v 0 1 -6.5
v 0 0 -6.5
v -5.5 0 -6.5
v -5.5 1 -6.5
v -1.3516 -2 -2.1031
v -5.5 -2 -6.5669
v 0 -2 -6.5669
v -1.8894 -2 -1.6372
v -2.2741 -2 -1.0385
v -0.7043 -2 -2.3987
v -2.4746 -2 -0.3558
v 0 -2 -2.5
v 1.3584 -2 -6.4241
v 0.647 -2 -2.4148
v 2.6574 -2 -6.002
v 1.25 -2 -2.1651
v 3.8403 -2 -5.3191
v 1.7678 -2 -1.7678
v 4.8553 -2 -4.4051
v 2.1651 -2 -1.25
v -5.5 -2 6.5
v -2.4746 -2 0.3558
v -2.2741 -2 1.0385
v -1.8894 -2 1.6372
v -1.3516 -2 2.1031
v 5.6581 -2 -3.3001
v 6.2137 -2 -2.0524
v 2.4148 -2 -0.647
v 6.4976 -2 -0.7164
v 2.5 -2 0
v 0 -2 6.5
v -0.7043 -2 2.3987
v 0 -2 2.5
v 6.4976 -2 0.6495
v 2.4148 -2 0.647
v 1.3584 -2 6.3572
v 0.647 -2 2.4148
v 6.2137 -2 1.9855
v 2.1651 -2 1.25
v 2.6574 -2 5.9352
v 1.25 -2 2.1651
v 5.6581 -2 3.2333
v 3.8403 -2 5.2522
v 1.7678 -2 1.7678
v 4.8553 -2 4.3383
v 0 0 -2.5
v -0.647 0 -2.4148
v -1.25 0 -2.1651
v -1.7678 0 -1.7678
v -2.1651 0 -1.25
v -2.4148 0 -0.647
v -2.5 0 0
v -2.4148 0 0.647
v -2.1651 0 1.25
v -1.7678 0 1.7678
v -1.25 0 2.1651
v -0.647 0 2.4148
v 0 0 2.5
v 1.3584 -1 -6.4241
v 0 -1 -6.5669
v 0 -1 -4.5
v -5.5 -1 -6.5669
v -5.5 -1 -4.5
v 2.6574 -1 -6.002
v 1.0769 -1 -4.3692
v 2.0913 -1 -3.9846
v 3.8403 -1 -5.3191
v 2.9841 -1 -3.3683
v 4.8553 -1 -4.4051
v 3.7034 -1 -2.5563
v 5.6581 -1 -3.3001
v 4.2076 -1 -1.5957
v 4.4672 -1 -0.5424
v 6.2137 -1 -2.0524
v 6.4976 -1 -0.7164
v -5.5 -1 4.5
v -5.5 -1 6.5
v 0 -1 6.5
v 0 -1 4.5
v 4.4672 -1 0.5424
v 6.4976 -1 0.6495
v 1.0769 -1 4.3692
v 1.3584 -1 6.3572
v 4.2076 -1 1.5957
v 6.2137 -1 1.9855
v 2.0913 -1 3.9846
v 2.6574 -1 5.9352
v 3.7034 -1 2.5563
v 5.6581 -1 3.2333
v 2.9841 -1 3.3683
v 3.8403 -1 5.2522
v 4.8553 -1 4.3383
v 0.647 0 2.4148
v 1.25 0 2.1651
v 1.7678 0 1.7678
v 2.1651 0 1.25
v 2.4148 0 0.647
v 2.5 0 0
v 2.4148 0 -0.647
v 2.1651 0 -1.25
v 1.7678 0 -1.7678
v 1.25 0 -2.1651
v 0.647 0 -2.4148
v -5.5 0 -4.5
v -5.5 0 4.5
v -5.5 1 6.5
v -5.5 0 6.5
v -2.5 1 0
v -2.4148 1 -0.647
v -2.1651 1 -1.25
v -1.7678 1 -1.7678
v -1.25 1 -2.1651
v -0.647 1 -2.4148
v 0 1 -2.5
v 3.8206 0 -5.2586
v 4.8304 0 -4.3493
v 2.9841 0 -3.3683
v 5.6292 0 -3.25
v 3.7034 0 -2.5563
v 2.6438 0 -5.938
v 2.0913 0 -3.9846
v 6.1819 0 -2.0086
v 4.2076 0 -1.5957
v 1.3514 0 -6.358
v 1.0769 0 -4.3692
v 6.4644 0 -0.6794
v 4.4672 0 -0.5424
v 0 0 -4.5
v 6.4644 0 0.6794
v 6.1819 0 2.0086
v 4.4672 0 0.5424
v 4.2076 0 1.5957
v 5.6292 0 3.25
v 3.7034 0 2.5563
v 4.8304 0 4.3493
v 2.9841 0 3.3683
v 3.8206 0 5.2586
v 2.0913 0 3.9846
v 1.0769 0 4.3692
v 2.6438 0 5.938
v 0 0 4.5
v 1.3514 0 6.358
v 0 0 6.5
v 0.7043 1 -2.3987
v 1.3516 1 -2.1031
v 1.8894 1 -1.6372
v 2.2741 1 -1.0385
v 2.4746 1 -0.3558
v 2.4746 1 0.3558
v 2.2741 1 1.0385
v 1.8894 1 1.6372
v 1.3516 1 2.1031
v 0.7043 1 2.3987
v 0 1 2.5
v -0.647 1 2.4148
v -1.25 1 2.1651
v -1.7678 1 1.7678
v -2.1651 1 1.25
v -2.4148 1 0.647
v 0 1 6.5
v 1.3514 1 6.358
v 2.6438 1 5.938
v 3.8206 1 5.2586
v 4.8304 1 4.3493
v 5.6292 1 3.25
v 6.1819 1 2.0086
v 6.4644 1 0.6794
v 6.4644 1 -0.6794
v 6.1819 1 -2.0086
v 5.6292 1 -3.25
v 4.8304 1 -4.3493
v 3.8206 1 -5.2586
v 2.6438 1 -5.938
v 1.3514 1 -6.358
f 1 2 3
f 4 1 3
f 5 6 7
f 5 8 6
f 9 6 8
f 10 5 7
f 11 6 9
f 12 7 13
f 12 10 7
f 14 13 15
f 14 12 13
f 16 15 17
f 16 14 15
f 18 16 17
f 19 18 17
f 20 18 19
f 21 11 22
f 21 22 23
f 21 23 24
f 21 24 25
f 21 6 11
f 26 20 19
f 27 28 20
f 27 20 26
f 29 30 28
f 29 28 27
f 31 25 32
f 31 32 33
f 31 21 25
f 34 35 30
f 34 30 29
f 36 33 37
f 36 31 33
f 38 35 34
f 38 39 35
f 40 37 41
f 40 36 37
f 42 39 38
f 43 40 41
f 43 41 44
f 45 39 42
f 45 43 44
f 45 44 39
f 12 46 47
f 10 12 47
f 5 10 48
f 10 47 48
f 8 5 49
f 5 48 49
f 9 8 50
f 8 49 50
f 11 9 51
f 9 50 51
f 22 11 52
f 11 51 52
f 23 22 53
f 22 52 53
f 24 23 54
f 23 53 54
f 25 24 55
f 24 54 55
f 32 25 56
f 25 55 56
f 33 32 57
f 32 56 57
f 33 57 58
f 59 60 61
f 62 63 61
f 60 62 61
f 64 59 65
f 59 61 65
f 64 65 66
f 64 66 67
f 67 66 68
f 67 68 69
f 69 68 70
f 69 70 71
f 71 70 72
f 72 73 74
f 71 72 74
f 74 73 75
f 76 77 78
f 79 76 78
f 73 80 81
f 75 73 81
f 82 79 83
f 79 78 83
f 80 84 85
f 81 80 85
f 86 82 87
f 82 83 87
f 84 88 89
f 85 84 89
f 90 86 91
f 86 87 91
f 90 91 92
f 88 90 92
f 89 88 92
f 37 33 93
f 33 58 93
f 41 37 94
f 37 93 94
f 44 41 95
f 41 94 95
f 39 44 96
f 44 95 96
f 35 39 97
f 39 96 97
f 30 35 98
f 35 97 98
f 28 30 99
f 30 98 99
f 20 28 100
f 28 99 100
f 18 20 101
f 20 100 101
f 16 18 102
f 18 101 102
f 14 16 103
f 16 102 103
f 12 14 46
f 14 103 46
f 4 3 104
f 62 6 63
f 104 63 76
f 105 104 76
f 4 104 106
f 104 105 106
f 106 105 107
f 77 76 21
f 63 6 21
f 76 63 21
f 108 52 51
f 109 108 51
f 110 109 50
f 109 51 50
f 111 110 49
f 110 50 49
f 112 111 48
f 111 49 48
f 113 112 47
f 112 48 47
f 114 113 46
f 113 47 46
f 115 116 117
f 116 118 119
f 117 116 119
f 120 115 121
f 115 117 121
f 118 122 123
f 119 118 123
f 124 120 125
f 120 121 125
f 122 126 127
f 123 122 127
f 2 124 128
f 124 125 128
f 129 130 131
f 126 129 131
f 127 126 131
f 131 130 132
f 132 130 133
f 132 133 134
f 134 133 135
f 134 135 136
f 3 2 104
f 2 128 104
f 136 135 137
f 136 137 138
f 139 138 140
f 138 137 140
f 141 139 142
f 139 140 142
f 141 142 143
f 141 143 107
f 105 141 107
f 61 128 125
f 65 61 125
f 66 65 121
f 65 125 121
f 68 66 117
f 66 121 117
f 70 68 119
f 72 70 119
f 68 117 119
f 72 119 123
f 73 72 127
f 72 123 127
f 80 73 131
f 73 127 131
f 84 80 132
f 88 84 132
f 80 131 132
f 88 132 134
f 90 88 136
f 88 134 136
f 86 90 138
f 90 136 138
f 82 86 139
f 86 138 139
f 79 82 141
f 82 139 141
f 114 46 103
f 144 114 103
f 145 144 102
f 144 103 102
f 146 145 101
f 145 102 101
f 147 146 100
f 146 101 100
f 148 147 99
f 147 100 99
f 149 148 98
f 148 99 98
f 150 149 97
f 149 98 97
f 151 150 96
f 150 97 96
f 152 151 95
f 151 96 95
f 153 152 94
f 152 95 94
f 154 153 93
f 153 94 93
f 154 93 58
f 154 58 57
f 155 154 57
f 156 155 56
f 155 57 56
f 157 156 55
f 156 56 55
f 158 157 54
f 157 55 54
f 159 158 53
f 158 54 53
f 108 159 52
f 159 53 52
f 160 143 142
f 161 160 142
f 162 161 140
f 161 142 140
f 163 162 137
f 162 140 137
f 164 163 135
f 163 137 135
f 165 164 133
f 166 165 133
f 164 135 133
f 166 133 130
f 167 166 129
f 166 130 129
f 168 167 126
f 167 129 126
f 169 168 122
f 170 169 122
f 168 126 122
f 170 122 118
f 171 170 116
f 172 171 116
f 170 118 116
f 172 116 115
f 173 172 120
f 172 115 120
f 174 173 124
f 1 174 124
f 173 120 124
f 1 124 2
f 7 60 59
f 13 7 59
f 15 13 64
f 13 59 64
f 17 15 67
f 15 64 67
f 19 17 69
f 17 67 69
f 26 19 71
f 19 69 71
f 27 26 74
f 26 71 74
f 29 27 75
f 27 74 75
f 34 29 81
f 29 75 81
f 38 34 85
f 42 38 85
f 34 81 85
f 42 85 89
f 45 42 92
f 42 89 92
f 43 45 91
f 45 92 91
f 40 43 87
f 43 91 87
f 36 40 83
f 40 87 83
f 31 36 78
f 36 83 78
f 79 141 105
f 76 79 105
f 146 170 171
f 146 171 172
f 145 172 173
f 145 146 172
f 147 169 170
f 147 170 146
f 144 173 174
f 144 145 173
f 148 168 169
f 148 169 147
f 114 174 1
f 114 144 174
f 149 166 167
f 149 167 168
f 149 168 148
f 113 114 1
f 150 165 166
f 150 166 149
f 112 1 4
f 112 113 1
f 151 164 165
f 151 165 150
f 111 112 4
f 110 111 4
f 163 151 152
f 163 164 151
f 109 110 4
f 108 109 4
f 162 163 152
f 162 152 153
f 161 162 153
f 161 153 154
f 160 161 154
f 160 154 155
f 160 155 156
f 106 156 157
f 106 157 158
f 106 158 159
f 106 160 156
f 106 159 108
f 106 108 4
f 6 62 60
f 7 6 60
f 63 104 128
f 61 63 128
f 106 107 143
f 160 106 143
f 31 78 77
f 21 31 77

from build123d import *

# Parameters (mm, degrees)
F1_DEPTH = 1
F3_DEPTH = 1
F5_DEPTH = 1


with BuildPart() as f1:
    # F0 (on Front) → F1 (new body)
    with BuildSketch(Plane.XZ):
        with BuildLine():
            ThreePointArc((0, 2.5), (1.767767, 1.767767), (2.5, 0))
            ThreePointArc((2.5, 0), (1.767767, -1.767767), (0, -2.5))
            Line((0, -2.5), (0, -4.5))
            ThreePointArc((0, -4.5), (4.5, 0), (0, 4.5))
            Line((0, 4.5), (0, 2.5))
        make_face()
        with BuildLine():
            ThreePointArc((0, -2.5), (-2.5, 0), (0, 2.5))
            Line((0, 2.5), (0, 4.5))
            Line((0, 4.5), (-5.5, 4.5))
            Line((-5.5, 4.5), (-5.5, -4.5))
            Line((-5.5, -4.5), (0, -4.5))
            Line((0, -4.5), (0, -2.5))
        make_face()
    extrude(amount=F1_DEPTH)

    # F2 (on face) → F3 (join)
    with BuildSketch(Plane.XZ.offset(1)):
        with BuildLine():
            Line((0, 2.5), (0, 6.5))
            Line((0, 6.5), (-5.5, 6.5))
            Line((-5.5, 6.5), (-5.5, -6.566851))
            Line((-5.5, -6.566851), (0, -6.566851))
            Line((0, -6.566851), (0, -2.5))
            ThreePointArc((0, -2.5), (-2.5, 0), (0, 2.5))
        make_face()
        with BuildLine():
            ThreePointArc((0, -6.566851), (6.533425, -0.033425), (0, 6.5))
            Line((0, 6.5), (0, 2.5))
            ThreePointArc((0, 2.5), (1.767767, 1.767767), (2.5, 0))
            ThreePointArc((2.5, 0), (1.767767, -1.767767), (0, -2.5))
            Line((0, -2.5), (0, -6.566851))
        make_face()
    extrude(amount=F3_DEPTH)

    # F4 (on face) → F5 (join)
    with BuildSketch(Plane(origin=(0, 0, 0), x_dir=(-1, 0, 0), z_dir=(0, 1, 0))):
        with BuildLine():
            ThreePointArc((0, 2.5), (1.767767, 1.767767), (2.5, 0))
            ThreePointArc((2.5, 0), (1.767767, -1.767767), (0, -2.5))
            Line((0, -2.5), (0, -6.5))
            Line((0, -6.5), (5.5, -6.5))
            Line((5.5, -6.5), (5.5, 6.5))
            Line((5.5, 6.5), (0, 6.5))
            Line((0, 6.5), (0, 2.5))
        make_face()
        with BuildLine():
            ThreePointArc((0, -2.5), (-2.5, 0), (0, 2.5))
            Line((0, 2.5), (0, 6.5))
            ThreePointArc((0, 6.5), (-6.5, 0), (0, -6.5))
            Line((0, -6.5), (0, -2.5))
        make_face()
    extrude(amount=F5_DEPTH)


solid = f1.part
